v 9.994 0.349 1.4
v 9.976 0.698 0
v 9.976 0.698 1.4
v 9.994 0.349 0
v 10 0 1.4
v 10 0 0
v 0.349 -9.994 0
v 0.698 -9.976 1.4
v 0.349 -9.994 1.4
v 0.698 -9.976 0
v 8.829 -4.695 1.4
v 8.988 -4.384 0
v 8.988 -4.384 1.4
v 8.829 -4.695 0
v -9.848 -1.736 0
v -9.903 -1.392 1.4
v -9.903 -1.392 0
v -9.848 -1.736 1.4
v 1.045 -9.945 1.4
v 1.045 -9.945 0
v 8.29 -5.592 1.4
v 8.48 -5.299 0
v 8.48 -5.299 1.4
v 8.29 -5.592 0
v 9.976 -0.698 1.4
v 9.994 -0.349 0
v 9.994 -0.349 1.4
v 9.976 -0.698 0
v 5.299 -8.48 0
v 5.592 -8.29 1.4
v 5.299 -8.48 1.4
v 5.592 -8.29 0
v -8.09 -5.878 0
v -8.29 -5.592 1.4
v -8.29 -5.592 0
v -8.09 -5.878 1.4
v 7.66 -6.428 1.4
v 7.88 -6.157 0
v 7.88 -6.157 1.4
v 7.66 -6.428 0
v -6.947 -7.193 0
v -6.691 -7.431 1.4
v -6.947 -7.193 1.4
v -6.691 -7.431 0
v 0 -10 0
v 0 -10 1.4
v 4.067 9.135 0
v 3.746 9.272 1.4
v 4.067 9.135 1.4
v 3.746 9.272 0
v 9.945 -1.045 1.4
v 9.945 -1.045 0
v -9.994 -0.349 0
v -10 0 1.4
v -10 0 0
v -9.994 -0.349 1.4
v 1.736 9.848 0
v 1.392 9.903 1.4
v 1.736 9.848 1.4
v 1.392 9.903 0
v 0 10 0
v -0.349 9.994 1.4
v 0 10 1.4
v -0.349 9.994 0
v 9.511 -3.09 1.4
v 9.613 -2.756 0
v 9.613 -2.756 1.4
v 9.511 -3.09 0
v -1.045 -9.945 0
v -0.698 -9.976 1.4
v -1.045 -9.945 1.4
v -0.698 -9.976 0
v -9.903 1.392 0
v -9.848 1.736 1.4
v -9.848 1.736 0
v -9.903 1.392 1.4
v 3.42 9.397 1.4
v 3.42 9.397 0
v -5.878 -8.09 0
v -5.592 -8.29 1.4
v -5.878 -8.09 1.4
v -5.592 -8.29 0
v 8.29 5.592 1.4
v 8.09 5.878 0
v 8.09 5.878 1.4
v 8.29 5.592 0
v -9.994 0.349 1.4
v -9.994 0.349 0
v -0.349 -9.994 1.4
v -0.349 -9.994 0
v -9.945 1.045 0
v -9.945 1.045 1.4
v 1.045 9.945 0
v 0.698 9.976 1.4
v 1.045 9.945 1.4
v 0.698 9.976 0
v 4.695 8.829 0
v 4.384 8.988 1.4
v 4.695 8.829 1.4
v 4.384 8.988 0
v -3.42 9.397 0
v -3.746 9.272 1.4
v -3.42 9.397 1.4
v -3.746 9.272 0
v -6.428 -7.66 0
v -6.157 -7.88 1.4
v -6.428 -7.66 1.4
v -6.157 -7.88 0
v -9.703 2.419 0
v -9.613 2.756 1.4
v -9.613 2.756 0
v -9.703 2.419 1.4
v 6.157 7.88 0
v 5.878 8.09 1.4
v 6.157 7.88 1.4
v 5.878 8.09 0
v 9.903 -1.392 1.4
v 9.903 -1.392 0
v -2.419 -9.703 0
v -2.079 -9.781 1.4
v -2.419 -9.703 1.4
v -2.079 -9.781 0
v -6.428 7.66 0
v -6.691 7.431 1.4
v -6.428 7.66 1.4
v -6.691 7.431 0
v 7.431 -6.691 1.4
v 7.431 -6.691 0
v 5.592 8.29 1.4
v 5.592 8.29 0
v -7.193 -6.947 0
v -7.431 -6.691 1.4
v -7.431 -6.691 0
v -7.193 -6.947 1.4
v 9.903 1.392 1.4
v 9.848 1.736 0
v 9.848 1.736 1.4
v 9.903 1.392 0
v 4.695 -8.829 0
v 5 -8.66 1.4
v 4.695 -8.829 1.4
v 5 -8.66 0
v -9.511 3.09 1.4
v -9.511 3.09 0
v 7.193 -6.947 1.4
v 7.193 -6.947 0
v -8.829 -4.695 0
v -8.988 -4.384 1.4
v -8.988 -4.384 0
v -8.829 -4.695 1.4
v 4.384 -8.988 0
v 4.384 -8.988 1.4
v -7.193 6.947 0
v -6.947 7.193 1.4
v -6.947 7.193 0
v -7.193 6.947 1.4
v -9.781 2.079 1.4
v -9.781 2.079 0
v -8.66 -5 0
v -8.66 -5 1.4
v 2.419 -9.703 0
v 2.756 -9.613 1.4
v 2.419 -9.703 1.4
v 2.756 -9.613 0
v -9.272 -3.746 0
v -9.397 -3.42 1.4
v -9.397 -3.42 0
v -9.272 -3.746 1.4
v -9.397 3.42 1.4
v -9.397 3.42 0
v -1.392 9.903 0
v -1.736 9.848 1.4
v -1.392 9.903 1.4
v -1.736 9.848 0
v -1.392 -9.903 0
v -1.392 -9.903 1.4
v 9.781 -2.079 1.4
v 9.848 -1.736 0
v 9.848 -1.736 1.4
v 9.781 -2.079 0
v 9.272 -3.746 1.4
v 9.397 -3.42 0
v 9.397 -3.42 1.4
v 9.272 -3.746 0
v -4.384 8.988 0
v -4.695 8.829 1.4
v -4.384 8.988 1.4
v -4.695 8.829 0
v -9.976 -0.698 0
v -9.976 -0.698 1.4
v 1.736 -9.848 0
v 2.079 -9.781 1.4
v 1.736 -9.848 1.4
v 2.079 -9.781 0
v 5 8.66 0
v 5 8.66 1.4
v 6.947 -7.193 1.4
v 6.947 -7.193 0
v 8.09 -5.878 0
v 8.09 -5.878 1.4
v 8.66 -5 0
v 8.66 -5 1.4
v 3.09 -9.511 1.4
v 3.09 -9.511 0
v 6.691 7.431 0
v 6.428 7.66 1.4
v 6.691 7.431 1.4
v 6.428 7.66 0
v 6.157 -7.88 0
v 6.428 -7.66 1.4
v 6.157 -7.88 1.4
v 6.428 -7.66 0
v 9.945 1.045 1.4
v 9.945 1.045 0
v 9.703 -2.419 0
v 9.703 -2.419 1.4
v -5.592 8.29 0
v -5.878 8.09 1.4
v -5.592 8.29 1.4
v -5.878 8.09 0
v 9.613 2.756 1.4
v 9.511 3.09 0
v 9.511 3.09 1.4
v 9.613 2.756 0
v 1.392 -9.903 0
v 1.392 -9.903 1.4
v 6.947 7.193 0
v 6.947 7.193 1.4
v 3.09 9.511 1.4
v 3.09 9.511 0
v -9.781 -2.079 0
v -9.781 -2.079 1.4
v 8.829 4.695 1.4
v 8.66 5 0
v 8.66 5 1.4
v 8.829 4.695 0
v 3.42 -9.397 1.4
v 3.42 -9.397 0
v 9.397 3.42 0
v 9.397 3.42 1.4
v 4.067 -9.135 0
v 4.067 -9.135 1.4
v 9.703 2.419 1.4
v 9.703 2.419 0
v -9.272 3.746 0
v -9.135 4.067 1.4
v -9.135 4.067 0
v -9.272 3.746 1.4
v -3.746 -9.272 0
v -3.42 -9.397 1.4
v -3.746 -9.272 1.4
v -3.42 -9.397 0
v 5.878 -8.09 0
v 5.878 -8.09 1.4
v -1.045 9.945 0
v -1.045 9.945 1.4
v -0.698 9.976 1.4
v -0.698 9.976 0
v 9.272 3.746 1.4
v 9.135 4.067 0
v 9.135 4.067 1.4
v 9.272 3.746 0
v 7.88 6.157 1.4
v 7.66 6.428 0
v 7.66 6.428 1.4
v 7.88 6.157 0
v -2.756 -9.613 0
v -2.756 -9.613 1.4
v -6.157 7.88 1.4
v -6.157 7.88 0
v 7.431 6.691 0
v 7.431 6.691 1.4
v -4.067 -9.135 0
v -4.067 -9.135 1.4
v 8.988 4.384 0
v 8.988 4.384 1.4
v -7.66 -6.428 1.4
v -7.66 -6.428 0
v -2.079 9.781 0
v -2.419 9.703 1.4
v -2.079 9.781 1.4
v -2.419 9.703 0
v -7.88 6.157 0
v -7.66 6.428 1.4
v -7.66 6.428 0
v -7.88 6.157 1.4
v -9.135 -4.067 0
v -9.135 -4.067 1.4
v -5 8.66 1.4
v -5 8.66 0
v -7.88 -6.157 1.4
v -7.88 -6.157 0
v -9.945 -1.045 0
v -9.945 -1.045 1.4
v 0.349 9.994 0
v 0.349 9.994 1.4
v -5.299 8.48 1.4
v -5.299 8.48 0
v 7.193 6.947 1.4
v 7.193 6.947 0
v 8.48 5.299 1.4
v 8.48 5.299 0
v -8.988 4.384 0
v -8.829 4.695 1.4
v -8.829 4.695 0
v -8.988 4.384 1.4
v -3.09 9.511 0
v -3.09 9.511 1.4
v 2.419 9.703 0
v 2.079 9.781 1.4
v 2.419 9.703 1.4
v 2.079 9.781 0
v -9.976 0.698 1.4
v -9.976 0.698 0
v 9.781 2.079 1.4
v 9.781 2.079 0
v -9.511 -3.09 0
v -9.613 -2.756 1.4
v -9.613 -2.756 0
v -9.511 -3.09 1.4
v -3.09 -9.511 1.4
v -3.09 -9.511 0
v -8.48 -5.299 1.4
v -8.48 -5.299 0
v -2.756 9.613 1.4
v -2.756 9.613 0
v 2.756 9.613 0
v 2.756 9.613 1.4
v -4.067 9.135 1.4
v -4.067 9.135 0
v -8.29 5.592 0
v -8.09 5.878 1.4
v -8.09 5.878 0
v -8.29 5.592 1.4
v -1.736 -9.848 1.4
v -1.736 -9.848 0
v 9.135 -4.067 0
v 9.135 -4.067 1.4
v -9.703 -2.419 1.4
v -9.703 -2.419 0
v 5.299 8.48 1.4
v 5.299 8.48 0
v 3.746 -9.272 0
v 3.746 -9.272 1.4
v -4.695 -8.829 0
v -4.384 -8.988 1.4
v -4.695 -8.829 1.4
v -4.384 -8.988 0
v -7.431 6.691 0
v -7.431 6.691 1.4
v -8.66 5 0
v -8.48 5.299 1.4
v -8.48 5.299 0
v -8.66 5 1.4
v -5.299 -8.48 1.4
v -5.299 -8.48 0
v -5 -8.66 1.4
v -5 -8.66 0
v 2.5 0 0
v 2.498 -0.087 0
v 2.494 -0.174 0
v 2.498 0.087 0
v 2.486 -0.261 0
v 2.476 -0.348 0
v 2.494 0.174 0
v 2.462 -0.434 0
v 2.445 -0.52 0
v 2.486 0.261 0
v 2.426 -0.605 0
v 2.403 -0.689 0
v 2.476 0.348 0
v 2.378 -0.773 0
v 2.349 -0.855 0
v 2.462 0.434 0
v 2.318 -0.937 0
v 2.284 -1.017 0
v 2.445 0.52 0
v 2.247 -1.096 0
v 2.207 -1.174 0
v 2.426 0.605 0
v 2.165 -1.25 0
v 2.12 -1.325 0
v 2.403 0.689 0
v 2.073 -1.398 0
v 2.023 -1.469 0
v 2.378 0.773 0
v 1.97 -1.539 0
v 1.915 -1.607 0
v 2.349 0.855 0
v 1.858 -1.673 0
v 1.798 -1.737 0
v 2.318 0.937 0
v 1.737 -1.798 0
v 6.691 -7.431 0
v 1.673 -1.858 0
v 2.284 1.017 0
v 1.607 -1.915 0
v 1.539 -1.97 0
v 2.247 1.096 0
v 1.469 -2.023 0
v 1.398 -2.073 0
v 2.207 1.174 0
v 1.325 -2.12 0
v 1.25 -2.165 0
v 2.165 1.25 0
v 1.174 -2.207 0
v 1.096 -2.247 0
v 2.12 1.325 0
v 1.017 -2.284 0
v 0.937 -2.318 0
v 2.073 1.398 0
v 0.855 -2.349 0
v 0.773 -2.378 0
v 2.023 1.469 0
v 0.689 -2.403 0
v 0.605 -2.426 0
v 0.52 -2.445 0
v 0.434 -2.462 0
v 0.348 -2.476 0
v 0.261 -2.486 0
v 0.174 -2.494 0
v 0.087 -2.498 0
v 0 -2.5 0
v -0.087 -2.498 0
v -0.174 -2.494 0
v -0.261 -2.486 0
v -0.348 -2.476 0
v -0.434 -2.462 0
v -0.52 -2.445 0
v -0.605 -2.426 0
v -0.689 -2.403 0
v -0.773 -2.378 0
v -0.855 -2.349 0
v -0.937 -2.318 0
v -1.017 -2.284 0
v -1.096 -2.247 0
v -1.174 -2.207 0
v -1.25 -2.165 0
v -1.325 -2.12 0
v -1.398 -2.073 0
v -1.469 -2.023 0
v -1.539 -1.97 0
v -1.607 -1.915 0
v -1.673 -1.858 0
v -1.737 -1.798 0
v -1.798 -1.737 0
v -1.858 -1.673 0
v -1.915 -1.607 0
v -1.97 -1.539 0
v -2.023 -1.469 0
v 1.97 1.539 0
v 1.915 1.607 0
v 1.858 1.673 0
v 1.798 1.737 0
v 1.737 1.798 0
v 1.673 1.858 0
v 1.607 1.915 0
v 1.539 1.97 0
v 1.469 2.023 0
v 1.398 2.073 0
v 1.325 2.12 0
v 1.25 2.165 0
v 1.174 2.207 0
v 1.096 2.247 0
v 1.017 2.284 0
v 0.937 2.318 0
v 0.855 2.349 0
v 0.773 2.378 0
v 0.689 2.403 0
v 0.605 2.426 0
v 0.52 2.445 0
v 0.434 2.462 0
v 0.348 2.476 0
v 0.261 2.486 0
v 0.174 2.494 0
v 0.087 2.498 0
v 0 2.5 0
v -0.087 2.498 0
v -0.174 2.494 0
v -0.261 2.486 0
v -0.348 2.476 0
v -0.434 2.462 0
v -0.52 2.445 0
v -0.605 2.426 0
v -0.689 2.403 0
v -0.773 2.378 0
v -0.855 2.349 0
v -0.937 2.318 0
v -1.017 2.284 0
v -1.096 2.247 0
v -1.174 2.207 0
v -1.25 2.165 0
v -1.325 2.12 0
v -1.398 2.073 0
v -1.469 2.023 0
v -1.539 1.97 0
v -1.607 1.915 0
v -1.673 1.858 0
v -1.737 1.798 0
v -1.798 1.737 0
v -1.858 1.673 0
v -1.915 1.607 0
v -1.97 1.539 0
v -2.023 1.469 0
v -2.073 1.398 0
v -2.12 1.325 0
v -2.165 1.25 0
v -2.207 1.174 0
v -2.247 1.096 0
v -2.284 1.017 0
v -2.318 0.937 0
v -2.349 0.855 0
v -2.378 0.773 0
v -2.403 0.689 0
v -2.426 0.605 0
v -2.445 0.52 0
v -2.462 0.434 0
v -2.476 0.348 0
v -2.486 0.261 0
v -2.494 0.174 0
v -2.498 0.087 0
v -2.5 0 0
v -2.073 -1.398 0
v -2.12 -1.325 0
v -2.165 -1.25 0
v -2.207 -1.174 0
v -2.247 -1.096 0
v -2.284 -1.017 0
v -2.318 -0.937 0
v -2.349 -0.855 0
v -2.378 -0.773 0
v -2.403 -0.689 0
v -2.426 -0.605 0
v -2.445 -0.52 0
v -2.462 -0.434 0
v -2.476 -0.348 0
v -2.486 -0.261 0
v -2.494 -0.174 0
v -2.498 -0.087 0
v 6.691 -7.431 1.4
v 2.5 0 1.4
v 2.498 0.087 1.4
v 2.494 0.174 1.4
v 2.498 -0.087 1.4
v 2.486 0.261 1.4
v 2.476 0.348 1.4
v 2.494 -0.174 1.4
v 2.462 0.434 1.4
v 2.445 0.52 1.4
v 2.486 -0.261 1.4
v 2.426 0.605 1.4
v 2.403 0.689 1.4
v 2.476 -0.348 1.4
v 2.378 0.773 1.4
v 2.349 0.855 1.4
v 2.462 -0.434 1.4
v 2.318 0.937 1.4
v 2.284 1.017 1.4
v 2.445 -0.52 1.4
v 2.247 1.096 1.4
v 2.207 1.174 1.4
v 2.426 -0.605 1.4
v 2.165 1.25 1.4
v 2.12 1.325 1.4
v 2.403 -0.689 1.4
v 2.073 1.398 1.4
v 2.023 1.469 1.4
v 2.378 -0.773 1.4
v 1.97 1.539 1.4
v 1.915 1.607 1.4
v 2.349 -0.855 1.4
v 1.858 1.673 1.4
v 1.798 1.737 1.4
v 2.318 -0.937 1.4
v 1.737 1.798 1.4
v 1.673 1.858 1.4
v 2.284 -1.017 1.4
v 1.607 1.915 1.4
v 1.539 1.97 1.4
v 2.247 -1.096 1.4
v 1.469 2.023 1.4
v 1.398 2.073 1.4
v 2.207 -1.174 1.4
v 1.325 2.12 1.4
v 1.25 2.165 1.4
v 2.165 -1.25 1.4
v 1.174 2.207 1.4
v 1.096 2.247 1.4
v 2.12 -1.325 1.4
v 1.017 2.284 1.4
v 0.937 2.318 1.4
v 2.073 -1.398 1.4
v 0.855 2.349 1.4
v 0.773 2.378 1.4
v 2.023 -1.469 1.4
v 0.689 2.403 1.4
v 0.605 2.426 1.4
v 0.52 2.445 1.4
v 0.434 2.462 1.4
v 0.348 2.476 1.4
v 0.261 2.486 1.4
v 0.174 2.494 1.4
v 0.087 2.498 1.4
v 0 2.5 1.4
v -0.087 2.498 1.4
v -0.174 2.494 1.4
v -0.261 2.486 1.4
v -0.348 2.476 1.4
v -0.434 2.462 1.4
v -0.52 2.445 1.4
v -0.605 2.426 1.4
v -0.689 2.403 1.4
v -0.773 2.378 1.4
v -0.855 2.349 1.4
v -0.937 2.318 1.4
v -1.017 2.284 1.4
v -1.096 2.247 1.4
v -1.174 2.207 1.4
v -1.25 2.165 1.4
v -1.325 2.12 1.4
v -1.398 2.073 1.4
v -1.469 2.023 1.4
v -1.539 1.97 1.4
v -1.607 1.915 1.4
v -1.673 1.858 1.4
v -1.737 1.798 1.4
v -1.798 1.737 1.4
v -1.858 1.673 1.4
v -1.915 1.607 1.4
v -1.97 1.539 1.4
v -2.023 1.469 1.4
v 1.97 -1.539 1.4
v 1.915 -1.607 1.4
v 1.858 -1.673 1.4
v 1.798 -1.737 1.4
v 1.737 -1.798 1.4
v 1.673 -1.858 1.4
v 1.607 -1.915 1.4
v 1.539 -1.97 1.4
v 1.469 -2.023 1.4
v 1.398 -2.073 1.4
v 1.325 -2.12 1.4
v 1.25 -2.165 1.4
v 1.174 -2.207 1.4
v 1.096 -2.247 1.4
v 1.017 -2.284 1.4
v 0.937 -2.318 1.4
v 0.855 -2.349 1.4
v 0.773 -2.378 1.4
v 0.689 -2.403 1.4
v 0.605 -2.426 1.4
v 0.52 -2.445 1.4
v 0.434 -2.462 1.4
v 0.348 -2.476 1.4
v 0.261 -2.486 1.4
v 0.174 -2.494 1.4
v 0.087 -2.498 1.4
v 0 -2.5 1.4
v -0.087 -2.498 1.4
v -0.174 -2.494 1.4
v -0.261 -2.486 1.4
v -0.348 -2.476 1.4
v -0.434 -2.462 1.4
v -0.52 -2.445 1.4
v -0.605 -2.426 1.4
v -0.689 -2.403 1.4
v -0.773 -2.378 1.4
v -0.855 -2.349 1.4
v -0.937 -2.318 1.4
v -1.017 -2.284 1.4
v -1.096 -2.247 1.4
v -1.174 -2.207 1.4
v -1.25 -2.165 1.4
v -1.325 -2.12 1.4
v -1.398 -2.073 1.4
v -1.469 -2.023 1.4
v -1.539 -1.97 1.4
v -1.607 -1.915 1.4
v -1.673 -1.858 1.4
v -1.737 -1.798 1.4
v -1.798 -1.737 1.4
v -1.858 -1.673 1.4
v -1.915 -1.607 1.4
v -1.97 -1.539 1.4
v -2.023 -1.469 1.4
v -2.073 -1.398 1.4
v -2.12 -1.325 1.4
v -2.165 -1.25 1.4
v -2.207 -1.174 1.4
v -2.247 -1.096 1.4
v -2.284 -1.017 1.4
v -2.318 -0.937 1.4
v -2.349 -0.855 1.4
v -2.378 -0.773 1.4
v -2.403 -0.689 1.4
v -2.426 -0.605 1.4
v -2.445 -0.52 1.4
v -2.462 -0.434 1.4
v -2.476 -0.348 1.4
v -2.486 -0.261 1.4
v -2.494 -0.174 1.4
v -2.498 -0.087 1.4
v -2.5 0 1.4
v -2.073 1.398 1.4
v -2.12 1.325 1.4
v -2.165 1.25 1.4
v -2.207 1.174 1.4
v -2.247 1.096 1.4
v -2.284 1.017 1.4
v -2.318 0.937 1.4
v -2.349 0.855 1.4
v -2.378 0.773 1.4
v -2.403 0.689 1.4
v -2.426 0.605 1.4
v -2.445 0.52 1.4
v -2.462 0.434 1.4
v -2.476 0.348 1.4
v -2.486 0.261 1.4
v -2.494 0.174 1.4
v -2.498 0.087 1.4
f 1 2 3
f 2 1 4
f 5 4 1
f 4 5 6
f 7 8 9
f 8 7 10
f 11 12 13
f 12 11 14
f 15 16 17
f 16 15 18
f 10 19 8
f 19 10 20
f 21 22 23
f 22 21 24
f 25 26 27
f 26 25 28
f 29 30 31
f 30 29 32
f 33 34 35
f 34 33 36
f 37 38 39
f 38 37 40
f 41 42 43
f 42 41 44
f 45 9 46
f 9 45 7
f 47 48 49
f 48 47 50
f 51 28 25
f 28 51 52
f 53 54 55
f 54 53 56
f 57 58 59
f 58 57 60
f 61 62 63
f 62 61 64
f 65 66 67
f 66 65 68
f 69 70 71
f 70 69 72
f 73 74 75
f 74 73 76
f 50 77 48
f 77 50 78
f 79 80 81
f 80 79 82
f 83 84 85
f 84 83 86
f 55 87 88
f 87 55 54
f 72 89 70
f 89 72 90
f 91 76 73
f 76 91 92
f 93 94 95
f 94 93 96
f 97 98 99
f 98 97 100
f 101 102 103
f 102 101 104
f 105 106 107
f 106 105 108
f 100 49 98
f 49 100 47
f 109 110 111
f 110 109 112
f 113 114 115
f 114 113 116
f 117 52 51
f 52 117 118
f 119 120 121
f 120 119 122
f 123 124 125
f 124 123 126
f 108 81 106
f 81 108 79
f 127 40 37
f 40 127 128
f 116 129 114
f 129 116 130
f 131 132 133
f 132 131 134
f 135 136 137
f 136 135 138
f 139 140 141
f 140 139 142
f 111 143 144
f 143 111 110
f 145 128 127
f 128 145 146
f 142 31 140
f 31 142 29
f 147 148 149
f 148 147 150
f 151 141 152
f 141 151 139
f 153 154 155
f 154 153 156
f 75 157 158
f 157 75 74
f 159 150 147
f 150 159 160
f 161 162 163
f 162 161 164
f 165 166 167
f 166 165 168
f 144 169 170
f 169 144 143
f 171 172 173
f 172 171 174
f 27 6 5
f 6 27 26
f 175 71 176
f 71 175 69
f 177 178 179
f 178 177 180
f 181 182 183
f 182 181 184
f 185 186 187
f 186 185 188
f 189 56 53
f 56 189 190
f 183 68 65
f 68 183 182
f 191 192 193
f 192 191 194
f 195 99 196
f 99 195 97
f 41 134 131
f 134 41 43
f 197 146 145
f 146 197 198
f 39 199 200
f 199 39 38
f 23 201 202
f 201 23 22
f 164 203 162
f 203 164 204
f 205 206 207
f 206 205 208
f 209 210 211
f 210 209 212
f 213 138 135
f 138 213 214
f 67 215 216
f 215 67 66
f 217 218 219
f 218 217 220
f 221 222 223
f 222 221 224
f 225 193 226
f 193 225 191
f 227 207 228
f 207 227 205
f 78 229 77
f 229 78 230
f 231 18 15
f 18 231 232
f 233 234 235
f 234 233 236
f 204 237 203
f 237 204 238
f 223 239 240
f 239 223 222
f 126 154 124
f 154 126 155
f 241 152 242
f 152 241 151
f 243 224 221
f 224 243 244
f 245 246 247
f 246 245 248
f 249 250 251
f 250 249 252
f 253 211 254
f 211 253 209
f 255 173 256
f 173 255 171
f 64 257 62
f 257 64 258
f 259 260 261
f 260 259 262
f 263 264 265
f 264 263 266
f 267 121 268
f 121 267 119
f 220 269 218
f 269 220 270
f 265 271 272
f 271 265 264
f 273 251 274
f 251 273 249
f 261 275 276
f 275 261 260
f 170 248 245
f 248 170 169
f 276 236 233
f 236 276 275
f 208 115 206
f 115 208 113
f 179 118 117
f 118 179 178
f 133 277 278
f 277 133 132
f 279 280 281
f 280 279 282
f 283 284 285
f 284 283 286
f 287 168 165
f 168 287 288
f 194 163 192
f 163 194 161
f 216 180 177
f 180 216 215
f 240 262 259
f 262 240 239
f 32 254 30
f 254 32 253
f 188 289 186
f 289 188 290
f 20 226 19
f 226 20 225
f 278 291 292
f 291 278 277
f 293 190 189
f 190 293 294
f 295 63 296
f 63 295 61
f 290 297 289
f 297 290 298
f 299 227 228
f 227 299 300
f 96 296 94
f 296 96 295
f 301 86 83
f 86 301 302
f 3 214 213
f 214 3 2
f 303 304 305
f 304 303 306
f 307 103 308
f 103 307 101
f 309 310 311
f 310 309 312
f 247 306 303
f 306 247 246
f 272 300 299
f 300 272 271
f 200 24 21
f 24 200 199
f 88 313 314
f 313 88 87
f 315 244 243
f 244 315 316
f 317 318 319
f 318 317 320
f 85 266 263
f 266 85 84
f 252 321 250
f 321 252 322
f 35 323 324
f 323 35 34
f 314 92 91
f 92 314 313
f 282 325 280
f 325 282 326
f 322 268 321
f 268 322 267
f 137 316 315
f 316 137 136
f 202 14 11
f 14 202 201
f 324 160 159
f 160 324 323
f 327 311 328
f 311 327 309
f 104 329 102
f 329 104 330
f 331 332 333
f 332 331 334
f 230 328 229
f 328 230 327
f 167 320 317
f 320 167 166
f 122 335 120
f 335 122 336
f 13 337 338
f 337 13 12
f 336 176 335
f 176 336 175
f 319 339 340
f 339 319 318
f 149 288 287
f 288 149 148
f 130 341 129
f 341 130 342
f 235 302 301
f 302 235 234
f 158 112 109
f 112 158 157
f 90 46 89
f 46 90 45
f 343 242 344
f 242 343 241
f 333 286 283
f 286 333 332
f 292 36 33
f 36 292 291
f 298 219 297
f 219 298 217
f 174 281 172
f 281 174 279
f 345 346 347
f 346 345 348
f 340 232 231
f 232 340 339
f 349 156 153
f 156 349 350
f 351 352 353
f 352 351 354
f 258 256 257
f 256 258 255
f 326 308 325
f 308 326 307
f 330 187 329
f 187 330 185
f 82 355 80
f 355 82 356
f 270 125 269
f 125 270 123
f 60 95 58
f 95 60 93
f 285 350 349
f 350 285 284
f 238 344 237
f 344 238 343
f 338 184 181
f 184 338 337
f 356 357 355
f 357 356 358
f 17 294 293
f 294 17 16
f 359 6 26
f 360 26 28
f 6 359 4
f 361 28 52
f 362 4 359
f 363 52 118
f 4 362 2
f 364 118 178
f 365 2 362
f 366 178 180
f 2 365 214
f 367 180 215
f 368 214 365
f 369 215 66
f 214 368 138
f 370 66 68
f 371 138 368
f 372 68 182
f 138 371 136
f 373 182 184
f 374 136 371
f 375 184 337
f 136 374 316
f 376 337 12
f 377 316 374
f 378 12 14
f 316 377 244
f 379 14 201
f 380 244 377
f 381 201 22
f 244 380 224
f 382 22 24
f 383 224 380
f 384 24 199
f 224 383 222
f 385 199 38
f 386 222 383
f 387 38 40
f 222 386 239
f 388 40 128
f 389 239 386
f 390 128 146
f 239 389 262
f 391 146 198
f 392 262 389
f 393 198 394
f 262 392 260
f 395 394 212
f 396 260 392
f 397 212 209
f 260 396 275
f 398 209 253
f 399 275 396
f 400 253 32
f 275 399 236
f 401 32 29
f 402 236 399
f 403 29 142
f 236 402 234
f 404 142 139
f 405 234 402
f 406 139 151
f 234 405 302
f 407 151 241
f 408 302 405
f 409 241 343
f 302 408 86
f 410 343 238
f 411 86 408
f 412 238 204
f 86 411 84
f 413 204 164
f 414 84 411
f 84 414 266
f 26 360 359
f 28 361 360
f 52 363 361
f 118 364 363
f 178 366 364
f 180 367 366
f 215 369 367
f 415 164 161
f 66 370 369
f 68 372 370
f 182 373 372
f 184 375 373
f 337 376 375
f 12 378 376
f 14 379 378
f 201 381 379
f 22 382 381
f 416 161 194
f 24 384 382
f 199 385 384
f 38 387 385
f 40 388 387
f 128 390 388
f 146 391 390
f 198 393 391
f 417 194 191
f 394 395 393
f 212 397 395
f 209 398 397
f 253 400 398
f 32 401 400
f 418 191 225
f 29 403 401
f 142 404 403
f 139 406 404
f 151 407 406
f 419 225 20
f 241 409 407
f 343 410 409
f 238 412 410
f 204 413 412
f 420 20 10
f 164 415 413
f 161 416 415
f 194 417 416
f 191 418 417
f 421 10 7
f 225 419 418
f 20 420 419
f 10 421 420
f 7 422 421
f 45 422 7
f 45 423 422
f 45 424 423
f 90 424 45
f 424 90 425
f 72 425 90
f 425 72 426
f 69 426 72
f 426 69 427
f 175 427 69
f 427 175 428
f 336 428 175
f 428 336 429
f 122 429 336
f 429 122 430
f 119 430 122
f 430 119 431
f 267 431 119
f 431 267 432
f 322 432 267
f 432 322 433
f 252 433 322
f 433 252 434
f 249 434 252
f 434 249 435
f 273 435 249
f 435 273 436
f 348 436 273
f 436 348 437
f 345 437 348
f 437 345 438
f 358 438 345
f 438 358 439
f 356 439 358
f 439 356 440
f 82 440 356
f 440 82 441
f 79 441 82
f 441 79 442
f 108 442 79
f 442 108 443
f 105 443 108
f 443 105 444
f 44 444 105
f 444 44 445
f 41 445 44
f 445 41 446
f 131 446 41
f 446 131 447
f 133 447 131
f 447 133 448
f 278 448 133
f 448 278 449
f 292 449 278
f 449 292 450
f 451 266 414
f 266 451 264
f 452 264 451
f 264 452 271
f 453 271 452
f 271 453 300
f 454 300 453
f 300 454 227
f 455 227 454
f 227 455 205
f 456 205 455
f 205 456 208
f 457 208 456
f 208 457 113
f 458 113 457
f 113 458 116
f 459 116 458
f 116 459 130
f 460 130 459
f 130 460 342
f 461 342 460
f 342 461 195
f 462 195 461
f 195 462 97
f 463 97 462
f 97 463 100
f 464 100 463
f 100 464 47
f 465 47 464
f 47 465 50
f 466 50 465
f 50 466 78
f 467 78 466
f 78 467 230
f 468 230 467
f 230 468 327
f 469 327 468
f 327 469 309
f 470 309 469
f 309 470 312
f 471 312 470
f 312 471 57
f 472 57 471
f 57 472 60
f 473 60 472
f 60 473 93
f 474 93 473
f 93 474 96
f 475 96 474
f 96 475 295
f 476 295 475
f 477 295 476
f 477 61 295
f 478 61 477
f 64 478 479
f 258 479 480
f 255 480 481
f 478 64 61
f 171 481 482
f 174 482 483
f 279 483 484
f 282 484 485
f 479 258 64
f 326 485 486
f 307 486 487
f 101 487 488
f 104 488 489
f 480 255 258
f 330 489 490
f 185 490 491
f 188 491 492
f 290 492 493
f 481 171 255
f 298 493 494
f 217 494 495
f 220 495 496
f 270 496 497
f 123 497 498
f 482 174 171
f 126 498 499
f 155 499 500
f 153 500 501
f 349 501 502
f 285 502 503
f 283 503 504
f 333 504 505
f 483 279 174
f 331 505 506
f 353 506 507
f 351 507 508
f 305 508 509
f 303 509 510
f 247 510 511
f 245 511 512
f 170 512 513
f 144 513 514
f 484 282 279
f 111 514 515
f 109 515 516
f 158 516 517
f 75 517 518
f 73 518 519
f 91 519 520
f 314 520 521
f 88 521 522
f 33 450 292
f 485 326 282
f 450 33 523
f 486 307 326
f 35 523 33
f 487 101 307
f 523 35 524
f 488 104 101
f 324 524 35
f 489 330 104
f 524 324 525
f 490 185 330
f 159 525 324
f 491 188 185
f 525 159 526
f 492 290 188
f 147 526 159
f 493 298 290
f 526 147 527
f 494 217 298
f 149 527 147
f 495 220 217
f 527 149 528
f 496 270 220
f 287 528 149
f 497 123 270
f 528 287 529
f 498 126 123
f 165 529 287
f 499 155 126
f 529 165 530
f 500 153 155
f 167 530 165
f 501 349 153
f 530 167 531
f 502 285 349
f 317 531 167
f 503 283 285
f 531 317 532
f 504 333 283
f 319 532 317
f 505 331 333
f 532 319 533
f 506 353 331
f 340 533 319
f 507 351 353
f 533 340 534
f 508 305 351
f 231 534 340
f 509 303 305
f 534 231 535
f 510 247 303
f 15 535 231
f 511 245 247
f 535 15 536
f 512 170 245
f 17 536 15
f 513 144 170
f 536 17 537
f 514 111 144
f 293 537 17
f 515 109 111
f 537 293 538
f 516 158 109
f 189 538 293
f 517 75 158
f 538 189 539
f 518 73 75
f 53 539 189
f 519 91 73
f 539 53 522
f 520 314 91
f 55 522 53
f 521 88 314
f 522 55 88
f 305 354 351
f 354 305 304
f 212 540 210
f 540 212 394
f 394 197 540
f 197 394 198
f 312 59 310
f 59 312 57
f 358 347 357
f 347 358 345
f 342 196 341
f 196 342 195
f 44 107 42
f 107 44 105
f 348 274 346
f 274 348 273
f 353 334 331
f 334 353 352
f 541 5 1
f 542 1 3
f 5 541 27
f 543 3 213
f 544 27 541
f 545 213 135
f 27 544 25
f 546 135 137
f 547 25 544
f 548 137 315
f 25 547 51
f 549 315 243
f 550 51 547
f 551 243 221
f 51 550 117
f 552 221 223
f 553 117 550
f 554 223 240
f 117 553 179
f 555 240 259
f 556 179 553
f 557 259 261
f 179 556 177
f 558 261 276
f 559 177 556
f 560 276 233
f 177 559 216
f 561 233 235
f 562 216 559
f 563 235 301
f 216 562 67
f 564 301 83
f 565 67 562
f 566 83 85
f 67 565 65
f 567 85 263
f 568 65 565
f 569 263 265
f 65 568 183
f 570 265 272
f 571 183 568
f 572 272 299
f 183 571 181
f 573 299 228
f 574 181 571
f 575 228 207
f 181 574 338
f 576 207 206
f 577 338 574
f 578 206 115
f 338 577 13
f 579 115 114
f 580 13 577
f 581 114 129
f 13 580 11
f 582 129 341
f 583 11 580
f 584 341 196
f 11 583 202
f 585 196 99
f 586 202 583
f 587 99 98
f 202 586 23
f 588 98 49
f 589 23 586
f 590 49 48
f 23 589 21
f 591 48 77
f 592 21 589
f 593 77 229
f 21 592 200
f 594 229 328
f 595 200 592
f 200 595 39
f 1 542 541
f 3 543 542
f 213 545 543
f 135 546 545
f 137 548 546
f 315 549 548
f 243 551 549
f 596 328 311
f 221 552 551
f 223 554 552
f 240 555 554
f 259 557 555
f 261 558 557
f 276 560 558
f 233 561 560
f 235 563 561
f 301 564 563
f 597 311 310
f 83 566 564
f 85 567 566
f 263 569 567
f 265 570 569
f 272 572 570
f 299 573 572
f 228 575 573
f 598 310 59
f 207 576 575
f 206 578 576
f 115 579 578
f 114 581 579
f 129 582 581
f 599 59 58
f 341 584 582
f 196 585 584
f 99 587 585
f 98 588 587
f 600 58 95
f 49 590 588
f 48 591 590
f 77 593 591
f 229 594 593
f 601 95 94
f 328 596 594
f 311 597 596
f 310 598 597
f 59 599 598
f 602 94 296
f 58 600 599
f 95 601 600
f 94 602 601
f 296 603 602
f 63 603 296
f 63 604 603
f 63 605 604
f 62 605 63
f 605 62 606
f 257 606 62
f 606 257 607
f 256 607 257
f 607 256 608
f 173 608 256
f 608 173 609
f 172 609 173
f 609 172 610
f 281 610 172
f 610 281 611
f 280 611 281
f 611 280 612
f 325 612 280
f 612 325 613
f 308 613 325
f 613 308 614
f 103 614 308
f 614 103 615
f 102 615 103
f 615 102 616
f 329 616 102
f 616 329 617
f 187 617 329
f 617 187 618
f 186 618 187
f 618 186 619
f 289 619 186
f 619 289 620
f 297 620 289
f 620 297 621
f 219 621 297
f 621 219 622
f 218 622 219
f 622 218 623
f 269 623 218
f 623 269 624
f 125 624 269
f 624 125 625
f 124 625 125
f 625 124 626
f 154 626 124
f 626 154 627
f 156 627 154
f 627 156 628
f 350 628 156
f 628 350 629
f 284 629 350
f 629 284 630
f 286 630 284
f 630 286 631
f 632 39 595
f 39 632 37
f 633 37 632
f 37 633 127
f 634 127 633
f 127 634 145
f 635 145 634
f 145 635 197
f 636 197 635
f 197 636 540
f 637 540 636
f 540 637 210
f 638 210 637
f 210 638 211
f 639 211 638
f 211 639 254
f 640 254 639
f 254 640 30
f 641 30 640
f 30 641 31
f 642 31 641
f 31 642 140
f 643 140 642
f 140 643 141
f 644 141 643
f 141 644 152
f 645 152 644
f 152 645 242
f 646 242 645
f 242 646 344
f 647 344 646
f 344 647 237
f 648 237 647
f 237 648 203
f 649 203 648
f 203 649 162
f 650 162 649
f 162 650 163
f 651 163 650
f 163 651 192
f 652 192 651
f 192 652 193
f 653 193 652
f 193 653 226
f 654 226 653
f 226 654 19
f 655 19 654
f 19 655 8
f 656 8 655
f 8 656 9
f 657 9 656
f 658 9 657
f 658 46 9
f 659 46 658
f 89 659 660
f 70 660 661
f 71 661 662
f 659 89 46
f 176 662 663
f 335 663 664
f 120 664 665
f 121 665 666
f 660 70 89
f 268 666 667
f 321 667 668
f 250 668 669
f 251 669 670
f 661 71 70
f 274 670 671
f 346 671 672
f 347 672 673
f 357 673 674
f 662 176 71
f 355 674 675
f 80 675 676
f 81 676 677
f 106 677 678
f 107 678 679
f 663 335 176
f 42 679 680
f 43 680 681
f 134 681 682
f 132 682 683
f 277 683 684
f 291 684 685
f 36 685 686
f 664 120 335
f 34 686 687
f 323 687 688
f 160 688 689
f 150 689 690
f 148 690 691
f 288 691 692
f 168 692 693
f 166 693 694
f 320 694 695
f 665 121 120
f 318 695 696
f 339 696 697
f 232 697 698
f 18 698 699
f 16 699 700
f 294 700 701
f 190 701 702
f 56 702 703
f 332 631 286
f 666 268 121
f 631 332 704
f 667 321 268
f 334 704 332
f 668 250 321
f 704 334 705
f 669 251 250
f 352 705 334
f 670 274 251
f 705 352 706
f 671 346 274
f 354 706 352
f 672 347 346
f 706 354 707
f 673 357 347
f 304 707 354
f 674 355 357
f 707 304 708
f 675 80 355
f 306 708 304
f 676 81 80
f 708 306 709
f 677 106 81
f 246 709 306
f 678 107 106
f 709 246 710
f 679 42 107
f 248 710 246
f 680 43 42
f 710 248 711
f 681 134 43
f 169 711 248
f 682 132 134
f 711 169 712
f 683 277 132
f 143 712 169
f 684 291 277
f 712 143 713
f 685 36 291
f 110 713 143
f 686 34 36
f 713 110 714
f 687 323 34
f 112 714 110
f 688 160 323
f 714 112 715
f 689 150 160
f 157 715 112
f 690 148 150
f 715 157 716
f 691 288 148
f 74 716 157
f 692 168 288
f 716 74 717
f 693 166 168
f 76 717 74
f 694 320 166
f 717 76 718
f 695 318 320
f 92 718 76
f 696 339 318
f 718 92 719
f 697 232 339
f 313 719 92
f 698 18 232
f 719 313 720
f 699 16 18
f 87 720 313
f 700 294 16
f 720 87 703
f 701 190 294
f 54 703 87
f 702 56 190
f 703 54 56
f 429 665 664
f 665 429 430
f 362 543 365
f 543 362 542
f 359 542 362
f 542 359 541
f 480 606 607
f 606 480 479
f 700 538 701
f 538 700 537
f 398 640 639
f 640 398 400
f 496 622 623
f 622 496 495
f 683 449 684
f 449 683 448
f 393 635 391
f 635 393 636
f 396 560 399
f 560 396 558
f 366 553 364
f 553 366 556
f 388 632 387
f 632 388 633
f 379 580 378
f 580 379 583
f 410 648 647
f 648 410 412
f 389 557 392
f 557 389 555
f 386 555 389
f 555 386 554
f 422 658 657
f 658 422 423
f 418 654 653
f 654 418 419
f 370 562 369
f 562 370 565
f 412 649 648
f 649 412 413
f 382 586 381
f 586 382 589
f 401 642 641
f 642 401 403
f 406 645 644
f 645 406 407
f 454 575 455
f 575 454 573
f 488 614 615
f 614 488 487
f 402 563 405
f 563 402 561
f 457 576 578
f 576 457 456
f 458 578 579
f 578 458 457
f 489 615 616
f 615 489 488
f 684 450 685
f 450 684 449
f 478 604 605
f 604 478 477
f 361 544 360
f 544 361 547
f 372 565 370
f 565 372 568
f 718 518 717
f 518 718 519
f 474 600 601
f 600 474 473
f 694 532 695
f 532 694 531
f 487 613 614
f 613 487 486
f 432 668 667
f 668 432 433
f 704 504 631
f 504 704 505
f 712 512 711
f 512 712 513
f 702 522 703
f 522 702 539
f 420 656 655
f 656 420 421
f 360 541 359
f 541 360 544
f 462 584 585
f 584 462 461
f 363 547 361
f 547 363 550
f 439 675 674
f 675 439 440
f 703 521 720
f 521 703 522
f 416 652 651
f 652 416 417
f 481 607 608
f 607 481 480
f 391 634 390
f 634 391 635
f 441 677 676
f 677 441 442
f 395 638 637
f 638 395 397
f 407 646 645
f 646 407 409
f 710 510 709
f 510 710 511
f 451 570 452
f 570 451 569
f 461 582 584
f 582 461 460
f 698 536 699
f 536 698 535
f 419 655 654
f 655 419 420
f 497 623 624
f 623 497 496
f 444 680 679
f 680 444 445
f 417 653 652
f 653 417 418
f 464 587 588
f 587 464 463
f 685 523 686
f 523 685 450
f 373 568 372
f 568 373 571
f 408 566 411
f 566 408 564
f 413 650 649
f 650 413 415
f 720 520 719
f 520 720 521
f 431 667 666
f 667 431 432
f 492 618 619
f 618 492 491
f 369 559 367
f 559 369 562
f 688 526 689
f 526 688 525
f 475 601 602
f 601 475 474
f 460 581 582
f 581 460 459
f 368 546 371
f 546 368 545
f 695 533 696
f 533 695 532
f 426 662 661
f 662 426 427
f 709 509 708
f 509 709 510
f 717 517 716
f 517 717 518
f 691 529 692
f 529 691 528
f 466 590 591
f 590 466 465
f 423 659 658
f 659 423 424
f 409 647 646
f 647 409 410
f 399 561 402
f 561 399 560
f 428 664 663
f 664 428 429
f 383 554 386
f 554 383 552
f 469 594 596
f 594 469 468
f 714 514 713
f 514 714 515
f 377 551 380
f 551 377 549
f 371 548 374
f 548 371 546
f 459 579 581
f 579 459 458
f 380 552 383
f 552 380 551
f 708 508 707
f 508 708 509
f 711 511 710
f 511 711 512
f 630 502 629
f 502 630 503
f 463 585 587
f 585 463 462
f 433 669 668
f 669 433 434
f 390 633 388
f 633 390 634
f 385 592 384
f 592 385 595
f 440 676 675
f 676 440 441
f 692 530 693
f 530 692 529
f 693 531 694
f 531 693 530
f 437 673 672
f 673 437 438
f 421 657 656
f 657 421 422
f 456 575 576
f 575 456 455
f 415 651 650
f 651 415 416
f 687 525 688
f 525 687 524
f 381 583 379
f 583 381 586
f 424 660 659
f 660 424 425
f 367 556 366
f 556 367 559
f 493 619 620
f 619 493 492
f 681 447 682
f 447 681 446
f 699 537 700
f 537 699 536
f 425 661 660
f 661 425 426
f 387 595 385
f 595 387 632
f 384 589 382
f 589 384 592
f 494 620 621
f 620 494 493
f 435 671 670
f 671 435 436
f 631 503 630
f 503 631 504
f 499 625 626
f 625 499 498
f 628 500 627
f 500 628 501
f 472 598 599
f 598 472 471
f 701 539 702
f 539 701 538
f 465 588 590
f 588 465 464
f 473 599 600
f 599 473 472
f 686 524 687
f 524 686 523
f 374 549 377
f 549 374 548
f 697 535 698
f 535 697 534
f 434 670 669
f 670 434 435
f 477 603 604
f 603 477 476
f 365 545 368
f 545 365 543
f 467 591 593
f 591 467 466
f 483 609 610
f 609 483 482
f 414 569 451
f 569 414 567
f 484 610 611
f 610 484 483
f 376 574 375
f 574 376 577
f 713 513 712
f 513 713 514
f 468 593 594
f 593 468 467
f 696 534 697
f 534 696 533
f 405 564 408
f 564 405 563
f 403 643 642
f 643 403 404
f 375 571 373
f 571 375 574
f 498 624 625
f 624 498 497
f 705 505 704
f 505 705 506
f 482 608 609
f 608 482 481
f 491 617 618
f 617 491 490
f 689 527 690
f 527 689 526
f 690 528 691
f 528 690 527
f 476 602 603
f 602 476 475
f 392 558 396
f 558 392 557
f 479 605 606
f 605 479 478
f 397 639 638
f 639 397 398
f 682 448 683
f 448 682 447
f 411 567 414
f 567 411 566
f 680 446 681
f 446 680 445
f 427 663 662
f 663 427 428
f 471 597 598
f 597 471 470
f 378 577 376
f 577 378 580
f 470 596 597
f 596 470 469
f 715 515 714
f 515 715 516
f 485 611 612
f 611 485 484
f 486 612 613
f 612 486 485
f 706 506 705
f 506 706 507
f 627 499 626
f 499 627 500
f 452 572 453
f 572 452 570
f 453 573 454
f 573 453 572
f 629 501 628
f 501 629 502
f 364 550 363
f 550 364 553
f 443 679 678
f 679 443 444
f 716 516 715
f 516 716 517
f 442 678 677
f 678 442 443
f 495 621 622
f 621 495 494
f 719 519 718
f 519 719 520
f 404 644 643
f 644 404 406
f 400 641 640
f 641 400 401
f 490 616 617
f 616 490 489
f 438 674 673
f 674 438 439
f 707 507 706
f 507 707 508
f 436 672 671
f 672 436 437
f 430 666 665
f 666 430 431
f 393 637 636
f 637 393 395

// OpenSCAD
$fn = 180;

inner_d = 5.0;
outer_d = 20.0;
thickness = 1.4;

difference() {
    cylinder(d = outer_d, h = thickness);
    translate([0, 0, -0.1])
        cylinder(d = inner_d, h = thickness + 0.2);
}
